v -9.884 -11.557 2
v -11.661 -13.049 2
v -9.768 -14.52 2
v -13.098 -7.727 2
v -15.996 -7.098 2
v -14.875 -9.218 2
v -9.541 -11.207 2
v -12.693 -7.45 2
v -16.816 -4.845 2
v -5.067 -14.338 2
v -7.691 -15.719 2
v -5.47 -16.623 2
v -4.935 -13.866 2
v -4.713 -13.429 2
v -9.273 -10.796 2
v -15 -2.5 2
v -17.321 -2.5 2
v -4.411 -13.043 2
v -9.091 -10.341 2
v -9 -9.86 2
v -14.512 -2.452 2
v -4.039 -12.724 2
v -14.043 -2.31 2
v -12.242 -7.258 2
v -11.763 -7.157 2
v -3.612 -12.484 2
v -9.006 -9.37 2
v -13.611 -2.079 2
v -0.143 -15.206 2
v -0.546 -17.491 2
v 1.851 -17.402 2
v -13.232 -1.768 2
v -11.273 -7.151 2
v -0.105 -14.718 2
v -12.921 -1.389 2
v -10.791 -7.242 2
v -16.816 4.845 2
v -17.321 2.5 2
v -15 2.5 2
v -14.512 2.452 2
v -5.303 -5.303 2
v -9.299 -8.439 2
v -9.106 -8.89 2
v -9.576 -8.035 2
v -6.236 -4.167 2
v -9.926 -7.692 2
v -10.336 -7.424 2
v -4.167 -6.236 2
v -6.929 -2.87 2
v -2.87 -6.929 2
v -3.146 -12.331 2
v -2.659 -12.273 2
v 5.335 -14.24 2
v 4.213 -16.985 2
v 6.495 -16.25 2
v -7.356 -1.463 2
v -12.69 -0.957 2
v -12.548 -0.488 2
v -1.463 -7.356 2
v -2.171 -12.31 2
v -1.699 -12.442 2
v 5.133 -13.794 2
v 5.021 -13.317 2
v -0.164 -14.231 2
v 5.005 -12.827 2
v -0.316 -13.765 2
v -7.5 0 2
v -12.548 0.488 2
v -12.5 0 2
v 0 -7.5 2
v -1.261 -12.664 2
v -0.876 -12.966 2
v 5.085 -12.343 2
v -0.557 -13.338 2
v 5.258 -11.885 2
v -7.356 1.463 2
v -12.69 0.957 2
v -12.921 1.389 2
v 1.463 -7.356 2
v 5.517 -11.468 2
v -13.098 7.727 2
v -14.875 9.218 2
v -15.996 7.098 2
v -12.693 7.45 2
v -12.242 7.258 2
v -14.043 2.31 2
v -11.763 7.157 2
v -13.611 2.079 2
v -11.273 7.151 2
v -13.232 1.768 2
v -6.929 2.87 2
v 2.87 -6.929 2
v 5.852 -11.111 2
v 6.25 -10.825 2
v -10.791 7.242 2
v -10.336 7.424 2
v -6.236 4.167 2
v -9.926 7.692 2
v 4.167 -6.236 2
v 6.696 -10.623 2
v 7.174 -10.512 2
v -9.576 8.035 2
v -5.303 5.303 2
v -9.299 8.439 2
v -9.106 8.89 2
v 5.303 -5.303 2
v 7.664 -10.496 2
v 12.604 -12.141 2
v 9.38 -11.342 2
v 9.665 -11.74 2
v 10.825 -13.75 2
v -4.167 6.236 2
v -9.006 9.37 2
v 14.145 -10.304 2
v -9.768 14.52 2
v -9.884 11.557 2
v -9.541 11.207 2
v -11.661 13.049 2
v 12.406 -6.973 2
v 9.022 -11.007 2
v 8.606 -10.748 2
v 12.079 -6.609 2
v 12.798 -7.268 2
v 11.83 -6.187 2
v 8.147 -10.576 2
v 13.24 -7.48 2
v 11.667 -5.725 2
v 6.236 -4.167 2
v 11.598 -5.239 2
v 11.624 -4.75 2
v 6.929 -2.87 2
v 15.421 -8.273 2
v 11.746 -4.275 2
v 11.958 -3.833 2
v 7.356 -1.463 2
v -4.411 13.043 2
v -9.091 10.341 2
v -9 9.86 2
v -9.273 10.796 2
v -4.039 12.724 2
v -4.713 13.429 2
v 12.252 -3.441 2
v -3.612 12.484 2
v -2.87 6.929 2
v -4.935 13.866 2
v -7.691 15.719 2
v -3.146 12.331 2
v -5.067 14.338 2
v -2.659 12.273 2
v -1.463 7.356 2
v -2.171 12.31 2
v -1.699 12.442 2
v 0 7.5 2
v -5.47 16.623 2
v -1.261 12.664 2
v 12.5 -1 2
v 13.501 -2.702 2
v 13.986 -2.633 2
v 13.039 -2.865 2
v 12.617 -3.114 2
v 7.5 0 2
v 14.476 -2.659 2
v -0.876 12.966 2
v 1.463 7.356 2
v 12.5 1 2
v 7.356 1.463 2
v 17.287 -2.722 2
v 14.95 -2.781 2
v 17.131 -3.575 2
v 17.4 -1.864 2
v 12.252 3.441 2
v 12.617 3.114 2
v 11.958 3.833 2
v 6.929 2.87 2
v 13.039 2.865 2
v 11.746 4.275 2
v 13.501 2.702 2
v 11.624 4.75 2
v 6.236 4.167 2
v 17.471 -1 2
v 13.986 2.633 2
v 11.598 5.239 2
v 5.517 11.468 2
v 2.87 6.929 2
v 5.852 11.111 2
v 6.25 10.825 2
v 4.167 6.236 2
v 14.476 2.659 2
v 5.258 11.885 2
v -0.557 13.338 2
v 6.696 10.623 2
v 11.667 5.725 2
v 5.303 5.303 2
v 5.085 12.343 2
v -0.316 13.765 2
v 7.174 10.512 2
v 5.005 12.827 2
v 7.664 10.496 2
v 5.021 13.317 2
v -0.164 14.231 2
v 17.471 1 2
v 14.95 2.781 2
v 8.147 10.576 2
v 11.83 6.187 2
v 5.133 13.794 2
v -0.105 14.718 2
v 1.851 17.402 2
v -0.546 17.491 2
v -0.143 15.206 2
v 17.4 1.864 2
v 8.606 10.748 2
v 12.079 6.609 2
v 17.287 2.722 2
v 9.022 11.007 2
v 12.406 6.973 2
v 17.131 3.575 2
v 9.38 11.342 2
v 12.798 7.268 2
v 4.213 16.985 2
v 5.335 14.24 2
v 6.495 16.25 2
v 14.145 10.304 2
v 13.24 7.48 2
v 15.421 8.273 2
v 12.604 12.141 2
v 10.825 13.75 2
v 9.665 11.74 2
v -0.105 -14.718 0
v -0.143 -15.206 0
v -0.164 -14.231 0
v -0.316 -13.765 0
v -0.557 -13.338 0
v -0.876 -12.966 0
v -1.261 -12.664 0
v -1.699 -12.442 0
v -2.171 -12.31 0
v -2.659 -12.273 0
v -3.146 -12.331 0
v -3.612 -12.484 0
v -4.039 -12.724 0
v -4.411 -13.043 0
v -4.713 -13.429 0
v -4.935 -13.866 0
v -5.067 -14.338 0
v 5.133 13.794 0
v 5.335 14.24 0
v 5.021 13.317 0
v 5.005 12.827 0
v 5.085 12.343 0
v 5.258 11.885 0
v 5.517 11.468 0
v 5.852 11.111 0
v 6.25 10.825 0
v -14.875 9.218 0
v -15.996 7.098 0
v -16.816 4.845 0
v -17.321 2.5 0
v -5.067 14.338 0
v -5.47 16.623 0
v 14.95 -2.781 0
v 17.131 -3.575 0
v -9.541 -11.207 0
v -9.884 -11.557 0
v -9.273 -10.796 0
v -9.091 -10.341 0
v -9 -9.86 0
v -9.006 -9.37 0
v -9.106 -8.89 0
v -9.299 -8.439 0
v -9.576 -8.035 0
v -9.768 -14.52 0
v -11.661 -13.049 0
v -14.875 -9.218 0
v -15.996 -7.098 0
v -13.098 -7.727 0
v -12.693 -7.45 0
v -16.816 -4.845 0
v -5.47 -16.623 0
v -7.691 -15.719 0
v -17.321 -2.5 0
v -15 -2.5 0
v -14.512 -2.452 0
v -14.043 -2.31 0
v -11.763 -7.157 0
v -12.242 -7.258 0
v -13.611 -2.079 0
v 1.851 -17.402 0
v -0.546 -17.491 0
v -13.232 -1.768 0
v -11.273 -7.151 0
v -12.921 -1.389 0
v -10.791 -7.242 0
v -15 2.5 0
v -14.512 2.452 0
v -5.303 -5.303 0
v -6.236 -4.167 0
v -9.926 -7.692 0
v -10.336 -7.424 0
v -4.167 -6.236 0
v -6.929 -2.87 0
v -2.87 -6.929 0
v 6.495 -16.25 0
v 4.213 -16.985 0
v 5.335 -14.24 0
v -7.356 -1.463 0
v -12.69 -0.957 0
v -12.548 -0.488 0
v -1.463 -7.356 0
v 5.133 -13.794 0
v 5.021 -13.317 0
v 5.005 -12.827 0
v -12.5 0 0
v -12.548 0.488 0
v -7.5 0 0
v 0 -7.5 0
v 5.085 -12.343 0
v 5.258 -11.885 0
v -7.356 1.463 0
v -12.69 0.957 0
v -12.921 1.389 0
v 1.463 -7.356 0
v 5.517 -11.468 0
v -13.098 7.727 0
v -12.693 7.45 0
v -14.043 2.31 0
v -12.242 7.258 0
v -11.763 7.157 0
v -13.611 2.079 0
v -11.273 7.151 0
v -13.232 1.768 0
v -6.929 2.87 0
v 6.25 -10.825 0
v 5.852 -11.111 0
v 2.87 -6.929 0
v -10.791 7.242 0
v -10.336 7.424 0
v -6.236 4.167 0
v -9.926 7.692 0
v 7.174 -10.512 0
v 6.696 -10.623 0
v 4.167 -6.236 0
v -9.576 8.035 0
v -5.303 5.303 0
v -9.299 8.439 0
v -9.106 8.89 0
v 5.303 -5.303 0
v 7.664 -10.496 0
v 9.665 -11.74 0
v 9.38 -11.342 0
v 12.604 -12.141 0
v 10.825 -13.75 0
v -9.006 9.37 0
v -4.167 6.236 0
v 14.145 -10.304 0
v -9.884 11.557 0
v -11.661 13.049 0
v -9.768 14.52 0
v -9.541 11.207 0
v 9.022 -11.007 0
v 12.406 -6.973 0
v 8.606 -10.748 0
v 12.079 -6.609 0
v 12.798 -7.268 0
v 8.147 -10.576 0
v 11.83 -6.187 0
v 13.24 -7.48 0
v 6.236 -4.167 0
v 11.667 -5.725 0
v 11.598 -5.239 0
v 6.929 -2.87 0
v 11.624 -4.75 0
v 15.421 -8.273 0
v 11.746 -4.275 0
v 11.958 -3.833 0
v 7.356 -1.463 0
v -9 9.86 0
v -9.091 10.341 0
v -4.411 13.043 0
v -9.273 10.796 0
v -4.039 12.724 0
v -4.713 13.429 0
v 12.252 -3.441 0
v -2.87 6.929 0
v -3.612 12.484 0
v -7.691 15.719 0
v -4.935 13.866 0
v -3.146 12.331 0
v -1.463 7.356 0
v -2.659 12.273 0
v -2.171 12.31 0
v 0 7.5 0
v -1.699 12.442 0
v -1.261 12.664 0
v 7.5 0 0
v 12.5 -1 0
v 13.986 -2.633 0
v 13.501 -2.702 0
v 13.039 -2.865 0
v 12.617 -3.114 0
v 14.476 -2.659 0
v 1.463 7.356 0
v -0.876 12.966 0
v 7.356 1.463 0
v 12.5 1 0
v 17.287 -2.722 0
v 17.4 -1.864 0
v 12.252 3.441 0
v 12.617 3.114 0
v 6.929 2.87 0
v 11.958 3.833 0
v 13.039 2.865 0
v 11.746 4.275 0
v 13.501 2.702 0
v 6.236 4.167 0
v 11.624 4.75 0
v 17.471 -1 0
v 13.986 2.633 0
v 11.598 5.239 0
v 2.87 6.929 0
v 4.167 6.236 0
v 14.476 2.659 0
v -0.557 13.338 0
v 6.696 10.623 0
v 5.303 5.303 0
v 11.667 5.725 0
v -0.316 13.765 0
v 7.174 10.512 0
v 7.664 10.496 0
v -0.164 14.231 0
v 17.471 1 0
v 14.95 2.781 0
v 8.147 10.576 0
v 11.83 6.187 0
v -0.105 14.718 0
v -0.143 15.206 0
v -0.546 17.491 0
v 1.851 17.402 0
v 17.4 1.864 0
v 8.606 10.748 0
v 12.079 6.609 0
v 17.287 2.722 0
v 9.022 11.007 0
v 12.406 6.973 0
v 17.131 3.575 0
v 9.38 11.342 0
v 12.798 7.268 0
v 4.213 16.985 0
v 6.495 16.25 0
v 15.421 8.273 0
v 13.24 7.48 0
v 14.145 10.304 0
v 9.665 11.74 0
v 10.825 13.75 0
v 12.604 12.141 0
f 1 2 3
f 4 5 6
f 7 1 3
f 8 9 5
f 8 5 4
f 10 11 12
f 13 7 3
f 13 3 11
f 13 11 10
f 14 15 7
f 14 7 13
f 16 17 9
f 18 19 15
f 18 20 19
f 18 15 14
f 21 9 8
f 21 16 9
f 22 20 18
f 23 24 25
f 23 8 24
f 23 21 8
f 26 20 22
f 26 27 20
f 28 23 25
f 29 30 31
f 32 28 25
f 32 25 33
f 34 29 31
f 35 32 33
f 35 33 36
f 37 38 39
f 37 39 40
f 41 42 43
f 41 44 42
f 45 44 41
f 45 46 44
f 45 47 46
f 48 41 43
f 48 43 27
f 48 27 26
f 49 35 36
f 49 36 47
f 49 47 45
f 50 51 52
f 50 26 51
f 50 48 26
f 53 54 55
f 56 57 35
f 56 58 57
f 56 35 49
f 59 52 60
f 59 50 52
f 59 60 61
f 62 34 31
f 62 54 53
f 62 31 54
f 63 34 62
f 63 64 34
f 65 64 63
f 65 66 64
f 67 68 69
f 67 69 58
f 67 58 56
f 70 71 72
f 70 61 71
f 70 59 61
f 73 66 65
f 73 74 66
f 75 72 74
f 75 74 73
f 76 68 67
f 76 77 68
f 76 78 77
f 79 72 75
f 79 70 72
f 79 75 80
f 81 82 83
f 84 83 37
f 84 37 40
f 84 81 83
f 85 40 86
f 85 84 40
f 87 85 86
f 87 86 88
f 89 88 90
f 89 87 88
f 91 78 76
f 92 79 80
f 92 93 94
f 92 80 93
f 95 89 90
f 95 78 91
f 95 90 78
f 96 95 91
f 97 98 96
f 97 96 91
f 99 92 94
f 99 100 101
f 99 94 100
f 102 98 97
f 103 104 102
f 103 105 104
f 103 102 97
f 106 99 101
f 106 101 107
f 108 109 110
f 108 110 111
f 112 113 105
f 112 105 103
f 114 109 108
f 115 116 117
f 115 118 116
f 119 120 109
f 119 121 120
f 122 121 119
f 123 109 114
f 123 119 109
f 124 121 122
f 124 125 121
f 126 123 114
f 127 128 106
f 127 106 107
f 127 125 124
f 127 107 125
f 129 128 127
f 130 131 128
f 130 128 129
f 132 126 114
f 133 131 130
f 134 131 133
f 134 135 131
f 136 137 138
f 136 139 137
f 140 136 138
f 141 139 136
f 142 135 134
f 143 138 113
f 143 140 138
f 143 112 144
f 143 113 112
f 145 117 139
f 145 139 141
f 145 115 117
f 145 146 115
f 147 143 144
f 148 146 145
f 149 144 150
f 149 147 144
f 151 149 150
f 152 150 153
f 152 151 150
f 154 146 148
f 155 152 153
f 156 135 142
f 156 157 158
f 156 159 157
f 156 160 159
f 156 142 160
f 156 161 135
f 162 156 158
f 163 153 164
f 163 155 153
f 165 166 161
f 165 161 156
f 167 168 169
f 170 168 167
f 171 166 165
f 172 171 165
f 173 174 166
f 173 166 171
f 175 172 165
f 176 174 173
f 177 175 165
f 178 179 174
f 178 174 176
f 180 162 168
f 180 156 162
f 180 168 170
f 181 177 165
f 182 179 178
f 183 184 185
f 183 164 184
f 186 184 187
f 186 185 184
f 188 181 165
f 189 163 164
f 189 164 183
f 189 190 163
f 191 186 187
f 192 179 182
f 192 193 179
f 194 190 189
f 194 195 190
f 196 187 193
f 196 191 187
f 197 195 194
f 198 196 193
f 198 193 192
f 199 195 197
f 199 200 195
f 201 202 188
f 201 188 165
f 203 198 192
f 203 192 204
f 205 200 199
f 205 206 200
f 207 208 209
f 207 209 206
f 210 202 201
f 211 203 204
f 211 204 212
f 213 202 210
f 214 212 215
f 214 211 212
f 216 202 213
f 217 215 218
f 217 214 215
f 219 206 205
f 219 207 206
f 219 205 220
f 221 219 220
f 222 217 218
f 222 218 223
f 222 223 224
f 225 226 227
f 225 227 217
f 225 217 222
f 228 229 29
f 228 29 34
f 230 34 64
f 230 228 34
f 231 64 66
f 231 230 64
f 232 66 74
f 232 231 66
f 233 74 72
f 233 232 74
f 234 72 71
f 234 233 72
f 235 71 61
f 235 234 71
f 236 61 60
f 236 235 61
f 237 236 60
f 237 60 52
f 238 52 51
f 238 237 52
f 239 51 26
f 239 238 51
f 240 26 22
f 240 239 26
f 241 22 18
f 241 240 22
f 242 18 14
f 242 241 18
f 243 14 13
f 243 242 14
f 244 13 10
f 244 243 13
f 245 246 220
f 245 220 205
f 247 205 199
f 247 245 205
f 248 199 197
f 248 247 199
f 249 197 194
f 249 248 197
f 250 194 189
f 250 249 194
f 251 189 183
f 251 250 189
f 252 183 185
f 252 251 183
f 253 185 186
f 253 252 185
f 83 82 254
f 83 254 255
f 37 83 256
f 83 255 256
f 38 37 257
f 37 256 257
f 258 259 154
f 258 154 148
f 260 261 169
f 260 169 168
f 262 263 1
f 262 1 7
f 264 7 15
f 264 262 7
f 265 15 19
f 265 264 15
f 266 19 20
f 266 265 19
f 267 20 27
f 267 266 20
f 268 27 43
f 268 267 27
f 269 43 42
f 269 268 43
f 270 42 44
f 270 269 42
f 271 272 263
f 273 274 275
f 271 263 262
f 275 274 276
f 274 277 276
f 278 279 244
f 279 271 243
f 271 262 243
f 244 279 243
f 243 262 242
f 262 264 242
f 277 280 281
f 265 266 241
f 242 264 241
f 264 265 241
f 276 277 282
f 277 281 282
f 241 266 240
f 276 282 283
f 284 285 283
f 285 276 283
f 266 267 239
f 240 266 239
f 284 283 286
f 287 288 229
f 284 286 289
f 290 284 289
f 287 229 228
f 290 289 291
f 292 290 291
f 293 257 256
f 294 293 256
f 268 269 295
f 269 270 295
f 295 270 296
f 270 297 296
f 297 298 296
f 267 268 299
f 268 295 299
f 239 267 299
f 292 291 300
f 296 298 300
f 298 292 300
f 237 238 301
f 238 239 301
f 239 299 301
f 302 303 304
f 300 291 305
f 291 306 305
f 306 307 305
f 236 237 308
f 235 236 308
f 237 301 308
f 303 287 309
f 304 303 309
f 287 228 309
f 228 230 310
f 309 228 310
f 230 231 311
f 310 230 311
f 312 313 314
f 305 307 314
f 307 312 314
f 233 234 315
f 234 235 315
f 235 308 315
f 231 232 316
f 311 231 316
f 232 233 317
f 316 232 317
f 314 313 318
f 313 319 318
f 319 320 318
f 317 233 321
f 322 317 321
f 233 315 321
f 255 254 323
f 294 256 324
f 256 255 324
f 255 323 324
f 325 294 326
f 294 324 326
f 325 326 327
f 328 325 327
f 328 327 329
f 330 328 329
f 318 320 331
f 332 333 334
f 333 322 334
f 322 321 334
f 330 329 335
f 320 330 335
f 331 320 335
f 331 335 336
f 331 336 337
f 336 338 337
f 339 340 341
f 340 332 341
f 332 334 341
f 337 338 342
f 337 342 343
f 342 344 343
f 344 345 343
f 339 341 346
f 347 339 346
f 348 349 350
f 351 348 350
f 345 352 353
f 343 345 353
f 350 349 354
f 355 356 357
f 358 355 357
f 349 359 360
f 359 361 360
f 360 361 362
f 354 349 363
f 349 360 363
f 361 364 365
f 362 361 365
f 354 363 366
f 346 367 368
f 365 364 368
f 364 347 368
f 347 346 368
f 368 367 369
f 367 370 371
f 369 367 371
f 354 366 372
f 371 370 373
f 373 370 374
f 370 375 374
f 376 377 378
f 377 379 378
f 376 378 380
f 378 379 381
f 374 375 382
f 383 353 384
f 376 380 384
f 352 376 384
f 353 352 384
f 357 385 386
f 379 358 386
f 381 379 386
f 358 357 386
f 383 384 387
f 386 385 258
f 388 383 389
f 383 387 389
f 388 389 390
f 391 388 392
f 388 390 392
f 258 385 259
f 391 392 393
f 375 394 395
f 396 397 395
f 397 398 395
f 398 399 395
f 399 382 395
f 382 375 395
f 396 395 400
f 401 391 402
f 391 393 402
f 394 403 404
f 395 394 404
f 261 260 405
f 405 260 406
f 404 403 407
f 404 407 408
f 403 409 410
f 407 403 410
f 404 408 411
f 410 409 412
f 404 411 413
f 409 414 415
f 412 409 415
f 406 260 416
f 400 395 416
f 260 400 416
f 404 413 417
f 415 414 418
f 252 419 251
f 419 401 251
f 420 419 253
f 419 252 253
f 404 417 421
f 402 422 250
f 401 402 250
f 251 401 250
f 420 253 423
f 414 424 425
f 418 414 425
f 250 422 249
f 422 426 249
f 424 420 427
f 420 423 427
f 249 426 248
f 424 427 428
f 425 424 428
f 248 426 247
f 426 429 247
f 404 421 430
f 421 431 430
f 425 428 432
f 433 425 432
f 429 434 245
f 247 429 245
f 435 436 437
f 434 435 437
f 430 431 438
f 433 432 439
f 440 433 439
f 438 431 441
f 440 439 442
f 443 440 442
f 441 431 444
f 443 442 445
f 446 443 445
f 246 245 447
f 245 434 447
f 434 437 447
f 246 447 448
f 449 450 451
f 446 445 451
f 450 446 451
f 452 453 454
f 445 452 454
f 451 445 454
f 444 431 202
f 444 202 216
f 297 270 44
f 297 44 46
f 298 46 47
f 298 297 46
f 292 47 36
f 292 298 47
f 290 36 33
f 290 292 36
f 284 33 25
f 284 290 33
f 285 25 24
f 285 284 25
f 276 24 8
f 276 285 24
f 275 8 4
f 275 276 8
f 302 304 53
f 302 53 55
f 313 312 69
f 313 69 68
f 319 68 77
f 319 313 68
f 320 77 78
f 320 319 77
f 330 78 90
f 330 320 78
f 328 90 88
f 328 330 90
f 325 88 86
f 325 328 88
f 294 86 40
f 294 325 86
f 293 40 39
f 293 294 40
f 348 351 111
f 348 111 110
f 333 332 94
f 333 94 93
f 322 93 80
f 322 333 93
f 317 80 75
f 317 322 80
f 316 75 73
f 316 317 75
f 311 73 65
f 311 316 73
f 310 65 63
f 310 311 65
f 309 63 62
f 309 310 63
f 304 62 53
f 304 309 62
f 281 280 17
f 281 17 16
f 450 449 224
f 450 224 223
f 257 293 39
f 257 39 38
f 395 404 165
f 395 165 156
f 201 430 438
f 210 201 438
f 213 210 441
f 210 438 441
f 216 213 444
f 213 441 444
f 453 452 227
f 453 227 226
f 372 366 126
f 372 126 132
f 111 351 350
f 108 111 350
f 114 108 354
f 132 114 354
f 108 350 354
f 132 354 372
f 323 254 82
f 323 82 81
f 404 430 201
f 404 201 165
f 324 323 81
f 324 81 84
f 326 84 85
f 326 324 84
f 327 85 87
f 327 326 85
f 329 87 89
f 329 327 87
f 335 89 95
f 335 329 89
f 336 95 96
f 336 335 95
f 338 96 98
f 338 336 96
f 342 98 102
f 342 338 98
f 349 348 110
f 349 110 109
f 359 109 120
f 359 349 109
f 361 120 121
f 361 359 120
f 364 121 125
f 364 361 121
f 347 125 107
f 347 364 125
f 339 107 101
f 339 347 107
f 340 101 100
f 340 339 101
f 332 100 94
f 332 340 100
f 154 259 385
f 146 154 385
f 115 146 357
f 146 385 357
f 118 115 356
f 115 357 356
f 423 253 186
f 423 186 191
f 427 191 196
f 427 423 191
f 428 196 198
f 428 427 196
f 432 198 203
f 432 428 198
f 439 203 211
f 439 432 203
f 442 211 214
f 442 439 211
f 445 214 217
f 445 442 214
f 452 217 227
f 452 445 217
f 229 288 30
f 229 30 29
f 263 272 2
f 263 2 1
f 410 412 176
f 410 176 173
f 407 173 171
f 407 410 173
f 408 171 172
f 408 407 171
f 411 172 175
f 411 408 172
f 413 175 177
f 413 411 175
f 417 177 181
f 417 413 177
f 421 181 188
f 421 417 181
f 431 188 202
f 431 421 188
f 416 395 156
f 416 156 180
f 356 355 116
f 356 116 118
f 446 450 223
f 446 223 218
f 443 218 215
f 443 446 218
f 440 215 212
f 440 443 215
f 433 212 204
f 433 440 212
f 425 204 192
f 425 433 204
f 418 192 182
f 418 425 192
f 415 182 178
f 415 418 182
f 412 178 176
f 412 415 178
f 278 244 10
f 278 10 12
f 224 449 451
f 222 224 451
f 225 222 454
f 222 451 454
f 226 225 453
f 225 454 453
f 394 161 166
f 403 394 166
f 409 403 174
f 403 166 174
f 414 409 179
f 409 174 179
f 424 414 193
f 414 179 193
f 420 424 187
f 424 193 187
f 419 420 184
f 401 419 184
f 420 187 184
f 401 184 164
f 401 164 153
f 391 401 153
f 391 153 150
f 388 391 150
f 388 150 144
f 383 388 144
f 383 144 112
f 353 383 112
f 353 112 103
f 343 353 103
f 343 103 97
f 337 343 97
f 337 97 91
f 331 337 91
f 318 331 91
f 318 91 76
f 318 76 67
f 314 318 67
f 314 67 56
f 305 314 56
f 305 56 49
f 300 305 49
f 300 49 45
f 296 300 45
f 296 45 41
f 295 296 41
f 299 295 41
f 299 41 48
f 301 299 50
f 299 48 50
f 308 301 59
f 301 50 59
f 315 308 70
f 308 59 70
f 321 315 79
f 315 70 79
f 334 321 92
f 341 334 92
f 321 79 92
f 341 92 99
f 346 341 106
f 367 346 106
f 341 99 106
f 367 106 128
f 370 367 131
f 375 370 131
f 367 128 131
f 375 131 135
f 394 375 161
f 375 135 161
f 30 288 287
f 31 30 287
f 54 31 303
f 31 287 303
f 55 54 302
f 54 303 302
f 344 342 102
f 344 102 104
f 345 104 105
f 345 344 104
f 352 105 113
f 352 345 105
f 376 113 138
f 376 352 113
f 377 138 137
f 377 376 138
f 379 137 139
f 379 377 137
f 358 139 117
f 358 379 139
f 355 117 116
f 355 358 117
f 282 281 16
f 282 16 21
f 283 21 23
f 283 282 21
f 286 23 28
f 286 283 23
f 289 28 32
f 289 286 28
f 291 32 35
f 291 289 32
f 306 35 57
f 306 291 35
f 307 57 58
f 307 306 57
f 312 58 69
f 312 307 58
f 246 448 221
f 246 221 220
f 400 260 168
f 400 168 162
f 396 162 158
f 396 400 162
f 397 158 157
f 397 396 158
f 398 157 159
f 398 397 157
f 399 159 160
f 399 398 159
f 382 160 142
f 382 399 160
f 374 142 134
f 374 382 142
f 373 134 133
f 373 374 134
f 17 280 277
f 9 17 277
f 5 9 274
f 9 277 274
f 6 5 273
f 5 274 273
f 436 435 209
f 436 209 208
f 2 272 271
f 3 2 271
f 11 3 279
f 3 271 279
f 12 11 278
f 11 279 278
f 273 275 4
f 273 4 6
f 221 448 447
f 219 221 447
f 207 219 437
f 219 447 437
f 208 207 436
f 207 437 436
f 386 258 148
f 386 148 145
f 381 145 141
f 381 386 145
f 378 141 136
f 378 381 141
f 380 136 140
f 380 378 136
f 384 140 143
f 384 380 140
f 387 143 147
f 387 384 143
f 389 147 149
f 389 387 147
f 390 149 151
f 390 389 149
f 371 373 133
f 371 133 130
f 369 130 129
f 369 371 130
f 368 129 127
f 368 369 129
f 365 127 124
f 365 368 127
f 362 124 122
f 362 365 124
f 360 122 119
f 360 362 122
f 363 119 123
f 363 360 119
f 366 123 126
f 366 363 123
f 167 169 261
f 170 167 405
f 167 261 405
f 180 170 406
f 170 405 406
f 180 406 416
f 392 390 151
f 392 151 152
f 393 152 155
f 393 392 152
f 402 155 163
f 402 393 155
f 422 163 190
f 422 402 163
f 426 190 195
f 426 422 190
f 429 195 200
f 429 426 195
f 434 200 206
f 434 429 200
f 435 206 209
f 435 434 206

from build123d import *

# Parameters (mm, degrees)
SKETCH1_R           = 17.5
BOSS_EXTRUDE1_DEPTH = 2
CUT_EXTRUDE2_START  = -5
CUT_EXTRUDE2_DEPTH  = 5
SKETCH4_R           = 7.5
CUT_EXTRUDE3_DEPTH  = 5
CUT_EXTRUDE5_START  = -2
CUT_EXTRUDE5_DEPTH  = 2
CIRPATTERN4_COUNT   = 9


with BuildPart() as part:
    # Sketch1 → Boss-Extrude1 (new body)
    with BuildSketch(Plane.XY):
        Circle(SKETCH1_R)
    extrude(amount=BOSS_EXTRUDE1_DEPTH)

    # Sketch3 → Cut-Extrude2 (cut)
    with BuildSketch(Plane.XY.offset(2).offset(CUT_EXTRUDE2_START)):
        with BuildLine():
            Line((12.5, -1), (17.47140521, -1))
            ThreePointArc((17.47140521, -1), (17.492849842, -0.500204374), (17.5, 0))
            ThreePointArc((17.5, 0), (17.492849842, 0.500204374), (17.47140521, 1))
            Line((17.47140521, 1), (12.5, 1))
            Line((12.5, 1), (12.5, -1))
        make_face()
    extrude(amount=CUT_EXTRUDE2_DEPTH, mode=Mode.SUBTRACT)

    # Sketch4 → Cut-Extrude3 (cut)
    with BuildSketch(Plane.XY.offset(2)):
        Circle(SKETCH4_R)
    extrude(amount=-CUT_EXTRUDE3_DEPTH, mode=Mode.SUBTRACT)

    # Sketch2 → Cut-Extrude5 (cut)
    with BuildSketch(Plane.XY.offset(2).offset(CUT_EXTRUDE5_START)):
        with BuildLine():
            Line((-17.320508076, -2.5), (-15, -2.5))
            ThreePointArc((-15, -2.5), (-13.232233047, -1.767766953), (-12.5, 0))
            ThreePointArc((-12.5, 0), (-13.232233047, 1.767766953), (-15, 2.5))
            Line((-15, 2.5), (-17.320508076, 2.5))
            ThreePointArc((-17.320508076, 2.5), (-17.5, 0), (-17.320508076, -2.5))
        make_face()
    cut_extrude5 = extrude(amount=CUT_EXTRUDE5_DEPTH, mode=Mode.SUBTRACT)

    # CirPattern4: Cut-Extrude5 ×9 about axis
    cirpattern4_axis = Axis((0, 0, 0), (0, 0, 1))
    for i in range(1, CIRPATTERN4_COUNT):
        add(cut_extrude5.rotate(cirpattern4_axis, i * 360 / CIRPATTERN4_COUNT), mode=Mode.SUBTRACT)


solid = part.part
